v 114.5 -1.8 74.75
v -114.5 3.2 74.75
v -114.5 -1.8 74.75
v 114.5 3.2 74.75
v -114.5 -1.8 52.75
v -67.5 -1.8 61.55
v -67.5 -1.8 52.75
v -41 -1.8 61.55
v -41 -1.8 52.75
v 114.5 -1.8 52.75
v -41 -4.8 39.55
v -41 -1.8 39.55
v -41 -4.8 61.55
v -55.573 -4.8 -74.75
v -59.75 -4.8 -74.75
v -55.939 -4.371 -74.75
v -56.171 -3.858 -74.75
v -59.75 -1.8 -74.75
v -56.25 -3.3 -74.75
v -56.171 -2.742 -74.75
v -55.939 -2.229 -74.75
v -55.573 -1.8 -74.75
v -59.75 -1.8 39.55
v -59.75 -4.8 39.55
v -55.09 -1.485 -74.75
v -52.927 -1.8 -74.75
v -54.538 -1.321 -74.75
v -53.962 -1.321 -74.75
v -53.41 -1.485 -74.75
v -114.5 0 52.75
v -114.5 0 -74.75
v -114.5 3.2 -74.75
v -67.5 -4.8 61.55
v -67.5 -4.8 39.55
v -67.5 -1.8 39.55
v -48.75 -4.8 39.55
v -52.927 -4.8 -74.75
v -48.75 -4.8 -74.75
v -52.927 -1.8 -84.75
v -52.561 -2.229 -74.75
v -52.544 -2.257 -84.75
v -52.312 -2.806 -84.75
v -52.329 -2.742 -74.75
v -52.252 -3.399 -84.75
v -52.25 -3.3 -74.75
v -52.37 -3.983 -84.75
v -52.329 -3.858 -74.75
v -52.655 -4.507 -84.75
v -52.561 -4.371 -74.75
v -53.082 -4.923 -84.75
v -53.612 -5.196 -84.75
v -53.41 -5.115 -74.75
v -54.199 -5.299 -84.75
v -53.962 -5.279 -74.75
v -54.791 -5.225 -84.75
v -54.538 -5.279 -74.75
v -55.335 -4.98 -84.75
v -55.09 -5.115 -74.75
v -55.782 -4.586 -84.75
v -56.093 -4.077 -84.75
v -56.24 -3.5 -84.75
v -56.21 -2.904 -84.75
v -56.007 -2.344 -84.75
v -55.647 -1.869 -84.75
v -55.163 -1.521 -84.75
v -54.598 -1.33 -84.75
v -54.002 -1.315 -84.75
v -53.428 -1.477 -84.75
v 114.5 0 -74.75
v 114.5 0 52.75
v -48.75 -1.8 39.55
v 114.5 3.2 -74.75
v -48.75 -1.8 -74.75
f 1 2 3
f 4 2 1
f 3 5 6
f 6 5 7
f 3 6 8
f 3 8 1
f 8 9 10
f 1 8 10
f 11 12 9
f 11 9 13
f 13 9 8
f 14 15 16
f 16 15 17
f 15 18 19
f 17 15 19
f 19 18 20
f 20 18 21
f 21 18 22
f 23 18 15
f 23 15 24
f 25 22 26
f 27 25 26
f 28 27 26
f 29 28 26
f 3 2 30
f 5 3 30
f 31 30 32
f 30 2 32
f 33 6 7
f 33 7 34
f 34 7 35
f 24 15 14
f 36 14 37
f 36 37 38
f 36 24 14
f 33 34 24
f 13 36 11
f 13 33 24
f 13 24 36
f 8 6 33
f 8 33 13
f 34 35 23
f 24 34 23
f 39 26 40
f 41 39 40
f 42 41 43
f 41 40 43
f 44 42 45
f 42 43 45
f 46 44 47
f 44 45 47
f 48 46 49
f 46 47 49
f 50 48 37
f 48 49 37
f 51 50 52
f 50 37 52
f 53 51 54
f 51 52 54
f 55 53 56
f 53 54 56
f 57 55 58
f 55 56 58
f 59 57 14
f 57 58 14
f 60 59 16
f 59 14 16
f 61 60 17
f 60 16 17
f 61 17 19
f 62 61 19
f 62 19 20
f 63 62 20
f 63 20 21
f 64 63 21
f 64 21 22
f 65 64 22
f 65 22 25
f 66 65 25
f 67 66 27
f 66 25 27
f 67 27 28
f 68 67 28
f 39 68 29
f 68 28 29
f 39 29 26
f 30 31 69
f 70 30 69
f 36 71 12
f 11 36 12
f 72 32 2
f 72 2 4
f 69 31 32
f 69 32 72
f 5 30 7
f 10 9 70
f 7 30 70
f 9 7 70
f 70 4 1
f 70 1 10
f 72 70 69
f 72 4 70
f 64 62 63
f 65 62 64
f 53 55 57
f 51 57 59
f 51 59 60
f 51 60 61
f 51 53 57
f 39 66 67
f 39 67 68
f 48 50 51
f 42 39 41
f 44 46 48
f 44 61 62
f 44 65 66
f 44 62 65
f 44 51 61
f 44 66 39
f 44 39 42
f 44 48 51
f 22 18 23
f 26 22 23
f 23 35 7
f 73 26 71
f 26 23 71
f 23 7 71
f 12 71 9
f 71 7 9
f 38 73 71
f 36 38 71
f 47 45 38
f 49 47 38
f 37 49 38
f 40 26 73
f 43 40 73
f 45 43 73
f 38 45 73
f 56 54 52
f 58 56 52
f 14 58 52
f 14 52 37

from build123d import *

# Parameters (mm, degrees)
SKETCH1_W           = 229
SKETCH1_H           = 149.5
BOSS_EXTRUDE1_DEPTH = 3.2
SKETCH2_W           = 229
SKETCH2_H           = 22
BOSS_EXTRUDE2_DEPTH = 5
SKETCH3_W           = 26.5
SKETCH3_H           = 8.8
SKETCH3_W_2         = 11
SKETCH3_H_2         = 114.3
BOSS_EXTRUDE3_DEPTH = 3
SKETCH4_R           = 2
BOSS_EXTRUDE4_DEPTH = 10


with BuildPart() as part:
    # Sketch1 → Boss-Extrude1 (new body)
    with BuildSketch(Plane(origin=(0, 0, 0), x_dir=(1, 0, 0), z_dir=(0, 1, 0))):
        Rectangle(SKETCH1_W, SKETCH1_H)
    extrude(amount=BOSS_EXTRUDE1_DEPTH)

    # Sketch2 → Boss-Extrude2 (add)
    with BuildSketch(Plane(origin=(0, 3.2, 0), x_dir=(1, 0, 0), z_dir=(0, 1, 0))):
        with Locations((0, -63.75)):
            Rectangle(SKETCH2_W, SKETCH2_H)
    extrude(amount=-BOSS_EXTRUDE2_DEPTH)

    # Sketch3 → Boss-Extrude3 (add)
    with BuildSketch(Plane.XZ.offset(1.8)):
        Polygon((-41, 52.75), (-67.5, 52.75), (-67.5, 39.55), (-59.75, 39.55), (-48.75, 39.55), (-41, 39.55), align=None)
        with Locations((-54.25, 57.15)):
            Rectangle(SKETCH3_W, SKETCH3_H)
        with Locations((-54.25, -17.6)):
            Rectangle(SKETCH3_W_2, SKETCH3_H_2)
    extrude(amount=BOSS_EXTRUDE3_DEPTH)

    # Sketch4 → Boss-Extrude4 (add)
    with BuildSketch(Plane(origin=(0, 0, -74.75), x_dir=(-1, 0, 0), z_dir=(0, 0, -1))):
        with Locations(Location((54.25, -3.3, 0), (0, 0, 131.409622109))):
            Circle(SKETCH4_R)
    extrude(amount=BOSS_EXTRUDE4_DEPTH)


solid = part.part
